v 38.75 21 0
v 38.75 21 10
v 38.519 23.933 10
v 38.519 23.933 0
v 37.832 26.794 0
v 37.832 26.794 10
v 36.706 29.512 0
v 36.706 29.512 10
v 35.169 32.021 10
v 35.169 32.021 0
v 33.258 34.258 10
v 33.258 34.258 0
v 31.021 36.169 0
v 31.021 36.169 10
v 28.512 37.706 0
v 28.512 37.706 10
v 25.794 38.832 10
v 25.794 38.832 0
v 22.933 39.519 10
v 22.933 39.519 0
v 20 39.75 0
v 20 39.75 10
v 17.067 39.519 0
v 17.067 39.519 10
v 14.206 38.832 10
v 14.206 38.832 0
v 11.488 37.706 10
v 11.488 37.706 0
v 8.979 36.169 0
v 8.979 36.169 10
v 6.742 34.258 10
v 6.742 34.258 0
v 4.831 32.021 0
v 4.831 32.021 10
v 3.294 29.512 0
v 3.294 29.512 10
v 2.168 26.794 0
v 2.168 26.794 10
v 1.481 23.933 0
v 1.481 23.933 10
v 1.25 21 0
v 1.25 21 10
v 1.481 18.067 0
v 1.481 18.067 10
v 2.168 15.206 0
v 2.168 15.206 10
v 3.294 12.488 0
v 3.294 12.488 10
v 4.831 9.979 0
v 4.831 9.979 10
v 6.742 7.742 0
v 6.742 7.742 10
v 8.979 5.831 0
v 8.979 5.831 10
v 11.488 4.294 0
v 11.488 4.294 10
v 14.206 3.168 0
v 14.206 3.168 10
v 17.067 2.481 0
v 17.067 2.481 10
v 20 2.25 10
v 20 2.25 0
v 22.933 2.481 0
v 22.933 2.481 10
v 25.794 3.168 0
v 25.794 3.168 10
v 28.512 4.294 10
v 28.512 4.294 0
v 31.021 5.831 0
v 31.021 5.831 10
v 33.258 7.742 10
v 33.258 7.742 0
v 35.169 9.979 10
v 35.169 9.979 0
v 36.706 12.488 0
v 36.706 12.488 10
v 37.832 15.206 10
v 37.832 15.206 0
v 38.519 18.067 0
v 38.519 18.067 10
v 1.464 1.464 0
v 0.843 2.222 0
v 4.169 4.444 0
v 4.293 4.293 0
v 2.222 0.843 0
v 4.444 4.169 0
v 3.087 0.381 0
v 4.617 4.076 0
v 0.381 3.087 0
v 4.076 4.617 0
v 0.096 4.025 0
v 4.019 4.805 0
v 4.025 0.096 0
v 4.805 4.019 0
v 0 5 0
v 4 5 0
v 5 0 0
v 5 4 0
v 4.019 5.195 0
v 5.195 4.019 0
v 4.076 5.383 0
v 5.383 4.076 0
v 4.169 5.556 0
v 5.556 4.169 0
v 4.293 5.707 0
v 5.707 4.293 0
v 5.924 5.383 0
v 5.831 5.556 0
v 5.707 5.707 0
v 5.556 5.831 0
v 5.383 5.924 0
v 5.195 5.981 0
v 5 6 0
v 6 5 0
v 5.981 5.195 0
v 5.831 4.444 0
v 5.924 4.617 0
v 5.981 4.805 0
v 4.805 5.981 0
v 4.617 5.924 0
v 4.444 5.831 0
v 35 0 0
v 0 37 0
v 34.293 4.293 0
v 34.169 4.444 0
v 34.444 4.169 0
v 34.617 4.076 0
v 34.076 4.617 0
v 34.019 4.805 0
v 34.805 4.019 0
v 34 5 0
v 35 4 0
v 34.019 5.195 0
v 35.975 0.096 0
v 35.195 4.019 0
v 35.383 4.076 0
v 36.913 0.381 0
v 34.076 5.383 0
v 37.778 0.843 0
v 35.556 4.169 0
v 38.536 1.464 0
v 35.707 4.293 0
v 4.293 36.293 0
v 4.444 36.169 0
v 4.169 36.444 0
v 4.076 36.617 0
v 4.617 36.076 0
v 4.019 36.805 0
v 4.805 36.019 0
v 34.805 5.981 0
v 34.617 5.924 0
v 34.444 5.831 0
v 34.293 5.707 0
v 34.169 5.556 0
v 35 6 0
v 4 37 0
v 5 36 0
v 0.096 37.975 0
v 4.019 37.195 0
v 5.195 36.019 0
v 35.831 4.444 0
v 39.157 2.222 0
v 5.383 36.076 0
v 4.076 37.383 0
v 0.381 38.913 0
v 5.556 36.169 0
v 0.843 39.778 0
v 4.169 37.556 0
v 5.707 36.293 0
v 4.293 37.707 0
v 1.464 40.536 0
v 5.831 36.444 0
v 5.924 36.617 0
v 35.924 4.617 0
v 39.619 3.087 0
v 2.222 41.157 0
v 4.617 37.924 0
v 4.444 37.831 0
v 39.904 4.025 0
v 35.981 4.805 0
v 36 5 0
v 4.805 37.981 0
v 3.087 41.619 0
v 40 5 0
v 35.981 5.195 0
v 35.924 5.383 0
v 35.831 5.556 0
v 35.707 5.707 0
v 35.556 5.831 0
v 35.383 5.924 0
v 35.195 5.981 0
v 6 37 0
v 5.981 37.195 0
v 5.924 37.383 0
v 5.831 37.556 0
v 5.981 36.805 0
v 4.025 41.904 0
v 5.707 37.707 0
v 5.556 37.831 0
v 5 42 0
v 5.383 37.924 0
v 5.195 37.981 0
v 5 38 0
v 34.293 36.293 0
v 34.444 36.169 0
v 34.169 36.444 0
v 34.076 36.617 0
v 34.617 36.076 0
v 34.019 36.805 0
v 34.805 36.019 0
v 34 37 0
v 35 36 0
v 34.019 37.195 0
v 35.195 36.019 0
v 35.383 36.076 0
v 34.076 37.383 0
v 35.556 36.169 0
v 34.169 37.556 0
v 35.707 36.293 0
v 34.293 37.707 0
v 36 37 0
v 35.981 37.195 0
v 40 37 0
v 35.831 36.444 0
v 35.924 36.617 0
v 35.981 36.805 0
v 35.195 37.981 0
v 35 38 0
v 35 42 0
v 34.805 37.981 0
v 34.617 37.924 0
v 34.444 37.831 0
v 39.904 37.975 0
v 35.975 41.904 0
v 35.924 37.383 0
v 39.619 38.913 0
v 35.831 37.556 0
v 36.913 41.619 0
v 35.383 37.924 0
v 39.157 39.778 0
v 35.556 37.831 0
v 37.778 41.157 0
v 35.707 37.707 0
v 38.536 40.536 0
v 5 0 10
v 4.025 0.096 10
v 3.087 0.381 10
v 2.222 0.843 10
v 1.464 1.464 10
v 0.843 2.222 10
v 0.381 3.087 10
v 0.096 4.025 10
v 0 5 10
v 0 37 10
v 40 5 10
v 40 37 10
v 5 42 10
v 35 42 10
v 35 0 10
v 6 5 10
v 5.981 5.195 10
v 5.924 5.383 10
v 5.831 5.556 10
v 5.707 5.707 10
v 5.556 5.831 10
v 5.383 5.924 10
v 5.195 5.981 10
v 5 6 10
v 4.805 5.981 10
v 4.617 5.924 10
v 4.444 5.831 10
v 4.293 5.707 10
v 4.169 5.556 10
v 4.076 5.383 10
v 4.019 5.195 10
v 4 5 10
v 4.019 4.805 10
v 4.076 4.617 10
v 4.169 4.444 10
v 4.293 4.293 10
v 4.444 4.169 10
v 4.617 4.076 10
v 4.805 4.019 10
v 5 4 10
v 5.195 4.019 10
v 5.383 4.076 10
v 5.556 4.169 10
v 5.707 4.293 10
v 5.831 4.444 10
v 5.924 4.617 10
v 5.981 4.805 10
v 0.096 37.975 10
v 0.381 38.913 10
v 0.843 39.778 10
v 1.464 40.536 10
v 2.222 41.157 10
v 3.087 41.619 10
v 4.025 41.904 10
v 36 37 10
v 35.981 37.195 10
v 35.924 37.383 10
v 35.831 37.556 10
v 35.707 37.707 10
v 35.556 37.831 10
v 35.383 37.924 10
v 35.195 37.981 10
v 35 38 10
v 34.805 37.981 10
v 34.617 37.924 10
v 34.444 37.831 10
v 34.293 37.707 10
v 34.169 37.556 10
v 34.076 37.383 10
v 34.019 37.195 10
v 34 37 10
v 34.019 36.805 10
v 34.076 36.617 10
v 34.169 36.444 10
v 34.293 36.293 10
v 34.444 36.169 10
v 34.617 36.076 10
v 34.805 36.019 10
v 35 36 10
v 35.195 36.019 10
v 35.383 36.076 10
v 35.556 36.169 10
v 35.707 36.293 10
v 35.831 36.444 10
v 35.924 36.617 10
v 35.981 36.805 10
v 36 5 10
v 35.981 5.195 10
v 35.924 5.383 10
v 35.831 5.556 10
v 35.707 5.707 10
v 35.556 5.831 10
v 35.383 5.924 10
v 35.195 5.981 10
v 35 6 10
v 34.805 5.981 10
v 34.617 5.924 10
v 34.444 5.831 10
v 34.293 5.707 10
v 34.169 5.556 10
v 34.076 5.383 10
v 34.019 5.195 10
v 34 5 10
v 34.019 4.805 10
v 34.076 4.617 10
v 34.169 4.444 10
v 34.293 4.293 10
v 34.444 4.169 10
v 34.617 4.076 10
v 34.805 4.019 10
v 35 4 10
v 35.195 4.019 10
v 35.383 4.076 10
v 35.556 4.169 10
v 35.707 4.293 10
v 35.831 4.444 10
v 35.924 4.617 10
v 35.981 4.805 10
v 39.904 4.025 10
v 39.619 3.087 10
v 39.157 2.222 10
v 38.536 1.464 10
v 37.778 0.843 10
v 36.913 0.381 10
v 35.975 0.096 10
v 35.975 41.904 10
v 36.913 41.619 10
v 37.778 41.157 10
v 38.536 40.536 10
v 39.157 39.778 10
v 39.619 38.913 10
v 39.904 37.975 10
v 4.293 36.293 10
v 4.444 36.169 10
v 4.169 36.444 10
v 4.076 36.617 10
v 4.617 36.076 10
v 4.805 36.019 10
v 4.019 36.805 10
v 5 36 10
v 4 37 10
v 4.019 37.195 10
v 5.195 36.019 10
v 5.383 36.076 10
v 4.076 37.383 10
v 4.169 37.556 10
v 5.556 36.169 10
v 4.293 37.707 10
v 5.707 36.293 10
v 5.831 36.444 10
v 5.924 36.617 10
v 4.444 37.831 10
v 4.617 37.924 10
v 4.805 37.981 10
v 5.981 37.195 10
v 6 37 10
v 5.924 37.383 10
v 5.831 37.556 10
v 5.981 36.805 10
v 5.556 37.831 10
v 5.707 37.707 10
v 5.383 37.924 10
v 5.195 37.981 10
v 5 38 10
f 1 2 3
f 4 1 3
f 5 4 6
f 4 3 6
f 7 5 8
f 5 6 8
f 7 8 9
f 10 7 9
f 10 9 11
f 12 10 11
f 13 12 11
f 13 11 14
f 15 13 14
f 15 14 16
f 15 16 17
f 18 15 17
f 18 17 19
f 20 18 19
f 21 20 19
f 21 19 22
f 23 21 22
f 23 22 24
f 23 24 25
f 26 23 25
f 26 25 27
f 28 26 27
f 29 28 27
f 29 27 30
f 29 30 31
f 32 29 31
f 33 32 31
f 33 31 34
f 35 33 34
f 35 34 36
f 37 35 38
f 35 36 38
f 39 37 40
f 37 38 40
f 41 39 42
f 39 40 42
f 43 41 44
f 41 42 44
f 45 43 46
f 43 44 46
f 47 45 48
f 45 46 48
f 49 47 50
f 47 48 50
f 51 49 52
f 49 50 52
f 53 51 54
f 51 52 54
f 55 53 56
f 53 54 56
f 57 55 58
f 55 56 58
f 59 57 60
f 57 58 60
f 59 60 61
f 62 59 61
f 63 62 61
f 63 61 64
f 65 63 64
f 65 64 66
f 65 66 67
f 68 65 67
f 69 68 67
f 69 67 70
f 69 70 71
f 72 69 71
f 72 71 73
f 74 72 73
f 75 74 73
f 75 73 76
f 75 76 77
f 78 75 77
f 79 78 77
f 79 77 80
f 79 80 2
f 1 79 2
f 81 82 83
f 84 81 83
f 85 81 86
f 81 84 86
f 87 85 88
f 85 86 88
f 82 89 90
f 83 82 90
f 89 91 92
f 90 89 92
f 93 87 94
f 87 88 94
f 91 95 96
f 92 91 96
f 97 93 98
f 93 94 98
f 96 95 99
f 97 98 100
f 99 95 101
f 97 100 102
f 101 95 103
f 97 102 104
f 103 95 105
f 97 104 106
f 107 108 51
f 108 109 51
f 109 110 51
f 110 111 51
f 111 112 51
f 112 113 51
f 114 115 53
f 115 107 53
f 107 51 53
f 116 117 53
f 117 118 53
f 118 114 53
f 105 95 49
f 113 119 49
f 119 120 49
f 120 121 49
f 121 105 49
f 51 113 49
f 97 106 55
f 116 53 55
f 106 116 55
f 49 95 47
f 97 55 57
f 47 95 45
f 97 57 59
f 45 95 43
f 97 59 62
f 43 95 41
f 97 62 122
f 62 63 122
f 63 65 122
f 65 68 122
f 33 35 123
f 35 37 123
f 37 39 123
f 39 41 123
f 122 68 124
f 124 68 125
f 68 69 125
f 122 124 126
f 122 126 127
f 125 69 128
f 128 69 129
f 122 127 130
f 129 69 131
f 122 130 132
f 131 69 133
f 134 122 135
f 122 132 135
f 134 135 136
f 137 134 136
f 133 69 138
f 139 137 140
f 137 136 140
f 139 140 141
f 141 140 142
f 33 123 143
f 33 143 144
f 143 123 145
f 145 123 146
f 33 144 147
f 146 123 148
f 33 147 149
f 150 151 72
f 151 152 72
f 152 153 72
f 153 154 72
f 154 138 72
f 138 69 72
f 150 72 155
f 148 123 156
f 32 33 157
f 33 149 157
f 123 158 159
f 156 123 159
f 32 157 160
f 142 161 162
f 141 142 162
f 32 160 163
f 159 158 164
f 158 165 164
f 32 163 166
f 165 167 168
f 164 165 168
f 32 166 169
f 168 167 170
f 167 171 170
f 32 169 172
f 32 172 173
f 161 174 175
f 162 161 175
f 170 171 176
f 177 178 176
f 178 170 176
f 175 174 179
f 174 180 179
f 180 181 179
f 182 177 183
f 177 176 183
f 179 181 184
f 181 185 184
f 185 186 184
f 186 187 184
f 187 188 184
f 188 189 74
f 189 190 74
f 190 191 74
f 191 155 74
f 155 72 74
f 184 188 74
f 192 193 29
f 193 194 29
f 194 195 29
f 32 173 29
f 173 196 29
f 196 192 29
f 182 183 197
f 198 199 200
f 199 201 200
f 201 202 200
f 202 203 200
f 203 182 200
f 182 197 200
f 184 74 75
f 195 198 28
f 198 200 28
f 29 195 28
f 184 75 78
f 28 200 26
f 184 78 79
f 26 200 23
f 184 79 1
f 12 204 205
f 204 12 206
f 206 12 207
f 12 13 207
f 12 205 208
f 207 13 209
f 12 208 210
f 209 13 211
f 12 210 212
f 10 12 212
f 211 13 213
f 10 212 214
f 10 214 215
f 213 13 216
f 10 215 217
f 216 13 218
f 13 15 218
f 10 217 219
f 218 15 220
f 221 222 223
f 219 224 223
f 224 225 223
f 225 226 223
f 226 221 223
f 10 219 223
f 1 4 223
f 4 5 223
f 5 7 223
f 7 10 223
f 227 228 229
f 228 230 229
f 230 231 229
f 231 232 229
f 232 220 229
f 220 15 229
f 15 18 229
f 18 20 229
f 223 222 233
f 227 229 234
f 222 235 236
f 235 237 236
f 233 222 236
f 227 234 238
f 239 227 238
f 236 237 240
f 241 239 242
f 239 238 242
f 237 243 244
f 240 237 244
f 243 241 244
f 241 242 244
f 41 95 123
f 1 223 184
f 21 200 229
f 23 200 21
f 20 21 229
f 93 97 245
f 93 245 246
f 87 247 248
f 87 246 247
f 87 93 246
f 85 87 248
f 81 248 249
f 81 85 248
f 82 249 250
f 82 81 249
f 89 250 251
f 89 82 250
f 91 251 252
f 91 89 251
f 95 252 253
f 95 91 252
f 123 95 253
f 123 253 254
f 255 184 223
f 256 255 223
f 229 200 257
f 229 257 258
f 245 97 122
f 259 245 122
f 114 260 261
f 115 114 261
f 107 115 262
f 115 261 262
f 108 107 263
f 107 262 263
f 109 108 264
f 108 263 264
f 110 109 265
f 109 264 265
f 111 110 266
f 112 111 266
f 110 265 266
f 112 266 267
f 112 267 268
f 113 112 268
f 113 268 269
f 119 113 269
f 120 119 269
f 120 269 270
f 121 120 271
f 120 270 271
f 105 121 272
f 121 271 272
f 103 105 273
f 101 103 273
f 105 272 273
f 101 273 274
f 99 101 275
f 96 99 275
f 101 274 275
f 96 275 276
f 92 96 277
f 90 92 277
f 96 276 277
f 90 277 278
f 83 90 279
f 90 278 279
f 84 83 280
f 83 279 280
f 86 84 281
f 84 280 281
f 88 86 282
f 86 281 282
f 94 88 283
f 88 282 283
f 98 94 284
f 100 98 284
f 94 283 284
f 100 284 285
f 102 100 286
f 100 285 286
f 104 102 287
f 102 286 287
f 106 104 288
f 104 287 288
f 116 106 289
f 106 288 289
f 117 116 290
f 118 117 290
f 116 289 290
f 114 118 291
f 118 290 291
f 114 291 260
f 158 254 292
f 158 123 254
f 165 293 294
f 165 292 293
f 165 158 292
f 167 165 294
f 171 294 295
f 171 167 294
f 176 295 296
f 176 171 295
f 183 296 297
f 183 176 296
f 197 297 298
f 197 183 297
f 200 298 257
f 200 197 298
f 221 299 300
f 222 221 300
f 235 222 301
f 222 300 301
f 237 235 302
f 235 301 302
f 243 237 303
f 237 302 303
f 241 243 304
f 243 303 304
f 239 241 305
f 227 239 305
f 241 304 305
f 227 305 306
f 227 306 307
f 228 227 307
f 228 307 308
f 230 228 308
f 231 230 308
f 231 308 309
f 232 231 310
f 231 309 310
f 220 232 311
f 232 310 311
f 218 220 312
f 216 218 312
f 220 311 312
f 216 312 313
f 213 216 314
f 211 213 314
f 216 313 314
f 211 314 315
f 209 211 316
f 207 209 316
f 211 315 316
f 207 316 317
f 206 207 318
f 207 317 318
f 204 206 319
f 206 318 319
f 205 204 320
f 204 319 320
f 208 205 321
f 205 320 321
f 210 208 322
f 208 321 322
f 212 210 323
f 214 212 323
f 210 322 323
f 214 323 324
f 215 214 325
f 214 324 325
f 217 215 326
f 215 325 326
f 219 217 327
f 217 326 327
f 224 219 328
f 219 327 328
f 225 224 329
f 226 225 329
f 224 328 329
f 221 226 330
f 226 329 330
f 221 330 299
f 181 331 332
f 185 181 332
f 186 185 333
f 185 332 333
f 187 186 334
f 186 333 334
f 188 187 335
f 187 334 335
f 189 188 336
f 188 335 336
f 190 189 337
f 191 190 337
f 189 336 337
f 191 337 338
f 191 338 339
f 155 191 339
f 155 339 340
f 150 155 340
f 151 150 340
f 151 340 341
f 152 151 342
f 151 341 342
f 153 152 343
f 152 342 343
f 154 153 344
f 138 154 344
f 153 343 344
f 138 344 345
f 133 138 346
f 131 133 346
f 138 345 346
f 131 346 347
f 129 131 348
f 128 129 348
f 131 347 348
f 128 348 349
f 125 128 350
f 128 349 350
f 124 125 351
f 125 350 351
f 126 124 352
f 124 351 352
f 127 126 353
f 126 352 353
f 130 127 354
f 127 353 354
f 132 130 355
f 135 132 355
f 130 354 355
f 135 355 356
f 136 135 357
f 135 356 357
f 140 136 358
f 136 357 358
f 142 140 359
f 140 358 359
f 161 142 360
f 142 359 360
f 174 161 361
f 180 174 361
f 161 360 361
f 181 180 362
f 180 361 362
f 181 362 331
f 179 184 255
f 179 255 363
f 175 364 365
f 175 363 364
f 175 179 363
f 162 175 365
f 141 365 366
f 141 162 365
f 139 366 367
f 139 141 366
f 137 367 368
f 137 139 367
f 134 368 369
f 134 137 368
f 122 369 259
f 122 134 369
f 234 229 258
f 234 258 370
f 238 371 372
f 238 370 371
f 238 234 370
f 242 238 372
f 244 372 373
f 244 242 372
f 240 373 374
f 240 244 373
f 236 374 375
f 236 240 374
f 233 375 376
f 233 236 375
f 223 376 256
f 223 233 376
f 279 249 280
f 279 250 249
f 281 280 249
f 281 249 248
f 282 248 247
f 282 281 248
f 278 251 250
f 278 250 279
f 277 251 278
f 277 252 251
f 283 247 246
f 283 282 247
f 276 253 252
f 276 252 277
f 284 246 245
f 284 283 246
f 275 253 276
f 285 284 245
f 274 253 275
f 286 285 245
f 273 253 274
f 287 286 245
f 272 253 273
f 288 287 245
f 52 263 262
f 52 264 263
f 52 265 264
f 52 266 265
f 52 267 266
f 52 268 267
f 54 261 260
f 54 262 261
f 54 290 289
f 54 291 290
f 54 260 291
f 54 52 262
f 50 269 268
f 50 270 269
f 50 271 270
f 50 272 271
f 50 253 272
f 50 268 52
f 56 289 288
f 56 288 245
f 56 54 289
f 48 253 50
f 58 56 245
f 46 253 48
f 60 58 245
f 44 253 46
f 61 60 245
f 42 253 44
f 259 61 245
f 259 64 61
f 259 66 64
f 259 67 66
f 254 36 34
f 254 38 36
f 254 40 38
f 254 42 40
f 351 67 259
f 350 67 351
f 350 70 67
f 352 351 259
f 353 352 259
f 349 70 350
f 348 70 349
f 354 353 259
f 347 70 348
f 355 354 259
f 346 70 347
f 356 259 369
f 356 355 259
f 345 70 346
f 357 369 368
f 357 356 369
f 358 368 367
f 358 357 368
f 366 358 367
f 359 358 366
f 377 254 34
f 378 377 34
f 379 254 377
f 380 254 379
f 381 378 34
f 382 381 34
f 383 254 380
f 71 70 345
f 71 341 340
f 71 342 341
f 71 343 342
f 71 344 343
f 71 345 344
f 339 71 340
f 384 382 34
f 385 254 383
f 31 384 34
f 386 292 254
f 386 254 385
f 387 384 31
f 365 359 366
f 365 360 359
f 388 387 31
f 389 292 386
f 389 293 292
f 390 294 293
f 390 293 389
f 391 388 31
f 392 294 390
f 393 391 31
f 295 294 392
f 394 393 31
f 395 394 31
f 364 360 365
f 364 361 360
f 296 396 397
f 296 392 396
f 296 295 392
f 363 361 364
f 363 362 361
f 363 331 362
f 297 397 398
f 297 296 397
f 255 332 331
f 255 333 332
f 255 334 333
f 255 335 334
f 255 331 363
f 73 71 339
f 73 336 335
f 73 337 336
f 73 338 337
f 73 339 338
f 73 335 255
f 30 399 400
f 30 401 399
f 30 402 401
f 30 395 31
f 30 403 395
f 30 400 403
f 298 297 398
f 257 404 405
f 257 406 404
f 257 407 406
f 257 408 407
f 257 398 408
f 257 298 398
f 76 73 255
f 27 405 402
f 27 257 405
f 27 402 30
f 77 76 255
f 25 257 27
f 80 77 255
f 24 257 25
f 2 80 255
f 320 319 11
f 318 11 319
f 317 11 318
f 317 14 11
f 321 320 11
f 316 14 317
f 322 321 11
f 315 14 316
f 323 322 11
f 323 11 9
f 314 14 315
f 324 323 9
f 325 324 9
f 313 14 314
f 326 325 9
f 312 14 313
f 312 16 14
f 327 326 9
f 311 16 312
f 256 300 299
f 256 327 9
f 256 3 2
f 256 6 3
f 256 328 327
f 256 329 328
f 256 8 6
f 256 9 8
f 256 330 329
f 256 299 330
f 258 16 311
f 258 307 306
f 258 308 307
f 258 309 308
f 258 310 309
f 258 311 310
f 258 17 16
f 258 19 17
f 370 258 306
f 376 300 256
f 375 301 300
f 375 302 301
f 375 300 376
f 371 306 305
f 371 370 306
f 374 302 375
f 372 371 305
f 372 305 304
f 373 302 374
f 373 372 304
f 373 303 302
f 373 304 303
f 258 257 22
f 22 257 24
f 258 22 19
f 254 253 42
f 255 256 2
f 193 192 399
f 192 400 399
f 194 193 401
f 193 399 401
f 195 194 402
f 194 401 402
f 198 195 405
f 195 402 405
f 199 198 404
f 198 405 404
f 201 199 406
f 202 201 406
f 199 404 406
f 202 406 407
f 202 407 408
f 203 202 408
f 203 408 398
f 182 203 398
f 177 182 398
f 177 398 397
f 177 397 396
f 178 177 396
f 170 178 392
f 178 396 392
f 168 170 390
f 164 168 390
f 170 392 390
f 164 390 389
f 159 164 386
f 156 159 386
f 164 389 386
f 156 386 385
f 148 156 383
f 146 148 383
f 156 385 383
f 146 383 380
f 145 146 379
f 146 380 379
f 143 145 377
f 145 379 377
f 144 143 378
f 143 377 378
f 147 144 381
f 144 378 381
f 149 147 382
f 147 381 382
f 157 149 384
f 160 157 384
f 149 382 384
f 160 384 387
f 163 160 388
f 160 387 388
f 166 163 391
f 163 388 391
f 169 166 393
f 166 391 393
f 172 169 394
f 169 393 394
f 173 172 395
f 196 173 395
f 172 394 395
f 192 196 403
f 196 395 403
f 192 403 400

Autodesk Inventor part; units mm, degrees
ref_plane "YZ Plane" through (0, 0, 0) normal (1, 0, 0) x (0, 1, 0)
ref_plane "XZ Plane" through (0, 0, 0) normal (0, 1, 0) x (-1, 0, 0)
ref_plane "XY Plane" through (0, 0, 0) normal (0, 0, 1) x (1, 0, 0)
ref_plane "Arbeitsebene1" through (0, 0, 0) normal (0, 0, 1) x (1, 0, 0)
sketch "Skizze1" plane through (0, 0, 0) normal (0, 0, 1) x (1, 0, 0)
  line L0 (0, 0) -> (40, 0) projected
  line L1 (40, 0) -> (40, 42) projected
  line L2 (0, 42) -> (40, 42) projected
  line L3 (0, 0) -> (0, 42) projected
  line L4 (5, 42) -> (35, 42)
  line L5 (40, 37) -> (40, 5)
  line L6 (35, 0) -> (5, 0)
  line L7 (0, 5) -> (0, 37)
  line L8 (0, 42) -> (40, 0) construction
  line L9 (40, 42) -> (0, 0) construction
  arc A0 (5, 42) -> (0, 37) centre (5, 37) ccw
  arc A1 (40, 37) -> (35, 42) centre (35, 37) ccw
  arc A2 (35, 0) -> (40, 5) centre (35, 5) ccw
  arc A3 (0, 5) -> (5, 0) centre (5, 5) ccw
  point P0 (20, 21)
  dimension "d0" = 5
extrude "Extrusion1" add sketch "Skizze1" along normal blind 10 contours A3 L3 A0 L2 A1 L1 A2 L0
sketch "Skizze2" plane through (0, 0, 10) normal (0, 0, 1) x (1, 0, 0)
  line L0 (0, 37) -> (0, 5) projected
  arc A0 (0, 5) -> (5, 0) centre (5, 5) ccw projected
  line L1 (5, 0) -> (35, 0) projected
  arc A1 (35, 0) -> (40, 5) centre (35, 5) ccw projected
  line L2 (40, 5) -> (40, 37) projected
  arc A2 (40, 37) -> (35, 42) centre (35, 37) ccw projected
  line L3 (35, 42) -> (5, 42) projected
  arc A3 (5, 42) -> (0, 37) centre (5, 37) ccw projected
  circle A4 centre (20, 21) radius 18.75
  point P0 (0, 0)
  dimension "d3" = 37.5
extrude "Extrusion2" cut sketch "Skizze2" against normal through all contours A4
sketch "Skizze3" plane through (0, 0, 10) normal (0, 0, 1) x (1, 0, 0)
  circle A0 centre (20, 21) radius 18.75 projected
  line L0 (0, 37) -> (0, 5) projected
  arc A1 (0, 5) -> (5, 0) centre (5, 5) ccw projected
  line L1 (5, 0) -> (35, 0) projected
  arc A2 (35, 0) -> (40, 5) centre (35, 5) ccw projected
  line L2 (40, 5) -> (40, 37) projected
  arc A3 (40, 37) -> (35, 42) centre (35, 37) ccw projected
  line L3 (35, 42) -> (5, 42) projected
  arc A4 (5, 42) -> (0, 37) centre (5, 37) ccw projected
  circle A5 centre (5, 37) radius 1
  circle A6 centre (35, 37) radius 1
  circle A7 centre (35, 5) radius 1
  circle A8 centre (5, 5) radius 1
  point P0 (0, 0)
  dimension "d6" = 2
  dimension "d7" = 2
  dimension "d8" = 2
  dimension "d9" = 2
extrude "Extrusion3" cut sketch "Skizze3" against normal through all contours A5 | A6 | A7 | A8
properties part number "02_Coolingfan"
